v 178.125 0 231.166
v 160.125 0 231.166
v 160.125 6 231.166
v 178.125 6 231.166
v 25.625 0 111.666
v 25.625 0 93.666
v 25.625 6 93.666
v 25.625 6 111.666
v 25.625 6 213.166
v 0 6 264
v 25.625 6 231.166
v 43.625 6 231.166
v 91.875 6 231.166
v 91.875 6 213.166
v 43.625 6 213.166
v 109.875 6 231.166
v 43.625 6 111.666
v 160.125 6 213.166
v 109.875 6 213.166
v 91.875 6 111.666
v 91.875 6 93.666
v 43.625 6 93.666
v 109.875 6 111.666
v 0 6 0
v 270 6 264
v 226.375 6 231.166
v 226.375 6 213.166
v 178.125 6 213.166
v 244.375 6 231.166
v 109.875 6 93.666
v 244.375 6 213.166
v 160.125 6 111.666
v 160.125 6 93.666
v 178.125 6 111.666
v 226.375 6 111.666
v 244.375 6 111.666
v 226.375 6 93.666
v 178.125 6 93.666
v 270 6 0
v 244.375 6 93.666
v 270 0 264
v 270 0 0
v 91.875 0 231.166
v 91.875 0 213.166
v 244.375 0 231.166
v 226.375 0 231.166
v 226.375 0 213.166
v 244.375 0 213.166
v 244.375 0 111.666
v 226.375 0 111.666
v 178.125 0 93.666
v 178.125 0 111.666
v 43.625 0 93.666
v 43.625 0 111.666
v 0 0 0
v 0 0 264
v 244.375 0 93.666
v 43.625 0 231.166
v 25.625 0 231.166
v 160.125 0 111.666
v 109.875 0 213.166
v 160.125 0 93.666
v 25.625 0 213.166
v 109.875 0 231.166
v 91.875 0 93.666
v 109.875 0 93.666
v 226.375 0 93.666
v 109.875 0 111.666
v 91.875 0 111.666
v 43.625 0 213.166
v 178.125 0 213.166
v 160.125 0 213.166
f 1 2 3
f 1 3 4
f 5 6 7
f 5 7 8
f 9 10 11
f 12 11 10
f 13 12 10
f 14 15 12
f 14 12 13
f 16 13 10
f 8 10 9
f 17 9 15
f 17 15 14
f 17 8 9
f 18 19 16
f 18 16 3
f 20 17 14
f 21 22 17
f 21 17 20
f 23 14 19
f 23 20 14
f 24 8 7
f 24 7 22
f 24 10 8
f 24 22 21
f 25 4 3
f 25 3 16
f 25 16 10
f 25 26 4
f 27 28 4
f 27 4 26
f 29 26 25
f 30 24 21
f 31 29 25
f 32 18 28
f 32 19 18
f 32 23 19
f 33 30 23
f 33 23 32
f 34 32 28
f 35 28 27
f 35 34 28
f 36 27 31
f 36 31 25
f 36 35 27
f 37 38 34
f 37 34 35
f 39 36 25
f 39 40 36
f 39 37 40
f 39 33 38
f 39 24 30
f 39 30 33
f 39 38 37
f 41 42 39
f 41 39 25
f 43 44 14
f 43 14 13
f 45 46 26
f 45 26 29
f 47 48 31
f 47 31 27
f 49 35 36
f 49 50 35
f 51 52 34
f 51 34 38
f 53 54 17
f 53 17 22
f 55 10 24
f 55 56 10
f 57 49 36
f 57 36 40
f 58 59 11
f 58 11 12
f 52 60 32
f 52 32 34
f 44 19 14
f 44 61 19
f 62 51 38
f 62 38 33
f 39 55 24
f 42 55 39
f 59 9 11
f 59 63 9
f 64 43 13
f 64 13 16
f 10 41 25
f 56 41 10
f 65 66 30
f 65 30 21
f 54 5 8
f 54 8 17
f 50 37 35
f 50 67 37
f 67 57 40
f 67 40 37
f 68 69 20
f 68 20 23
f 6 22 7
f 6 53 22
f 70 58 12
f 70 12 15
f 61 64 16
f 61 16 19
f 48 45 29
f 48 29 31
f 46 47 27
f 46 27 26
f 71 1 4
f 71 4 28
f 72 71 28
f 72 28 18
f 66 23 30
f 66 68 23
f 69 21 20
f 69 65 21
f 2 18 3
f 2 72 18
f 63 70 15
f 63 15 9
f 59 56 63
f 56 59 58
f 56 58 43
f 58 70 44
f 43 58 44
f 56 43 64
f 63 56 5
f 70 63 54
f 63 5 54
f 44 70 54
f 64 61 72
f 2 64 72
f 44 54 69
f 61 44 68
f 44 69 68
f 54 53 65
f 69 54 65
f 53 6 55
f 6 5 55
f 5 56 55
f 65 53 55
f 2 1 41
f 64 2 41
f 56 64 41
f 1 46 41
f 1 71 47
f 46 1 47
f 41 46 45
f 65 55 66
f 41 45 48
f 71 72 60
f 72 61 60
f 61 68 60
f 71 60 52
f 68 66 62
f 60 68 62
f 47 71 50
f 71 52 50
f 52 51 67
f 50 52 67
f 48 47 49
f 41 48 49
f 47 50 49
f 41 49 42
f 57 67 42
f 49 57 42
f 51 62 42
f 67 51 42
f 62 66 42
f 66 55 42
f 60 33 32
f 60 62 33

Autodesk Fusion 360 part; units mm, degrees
sketch "Sketch1" plane through (0, 0, 0) normal (0, 1, 0) x (1, 0, 0)
  line L0 (0, 0) -> (270, 0)
  line L1 (270, 0) -> (270, -264)
  line L2 (270, -264) -> (0, -264)
  line L3 (0, -264) -> (0, 0)
  dimension "d1" = 270
  dimension "d2" = 264
extrude "Extrude1" add sketch "Sketch1" along normal blind 6
sketch "Sketch2" plane through (0, 0, 0) normal (0, -1, 0) x (1, 0, 0)
  line L0 (270, 264) -> (0, 264)
  line L1 (0, 264) -> (0, 0)
  line L2 (0, 0) -> (270, 0)
  line L3 (270, 0) -> (270, 264)
  line L4 (25.625, 231.1665) -> (43.625, 231.1665)
  line L5 (43.625, 231.1665) -> (43.625, 213.1665)
  line L6 (43.625, 213.1665) -> (25.625, 213.1665)
  line L7 (25.625, 213.1665) -> (25.625, 231.1665)
  line L8 (91.875, 231.1665) -> (109.875, 231.1665)
  line L9 (109.875, 231.1665) -> (109.875, 213.1665)
  line L10 (109.875, 213.1665) -> (91.875, 213.1665)
  line L11 (91.875, 213.1665) -> (91.875, 231.1665)
  line L12 (160.125, 231.1665) -> (178.125, 231.1665)
  line L13 (178.125, 231.1665) -> (178.125, 213.1665)
  line L14 (178.125, 213.1665) -> (160.125, 213.1665)
  line L15 (160.125, 213.1665) -> (160.125, 231.1665)
  line L16 (226.375, 231.1665) -> (244.375, 231.1665)
  line L17 (244.375, 231.1665) -> (244.375, 213.1665)
  line L18 (244.375, 213.1665) -> (226.375, 213.1665)
  line L19 (226.375, 213.1665) -> (226.375, 231.1665)
  line L20 (25.625, 111.6665) -> (43.625, 111.6665)
  line L21 (43.625, 111.6665) -> (43.625, 93.6665)
  line L22 (43.625, 93.6665) -> (25.625, 93.6665)
  line L23 (25.625, 93.6665) -> (25.625, 111.6665)
  line L24 (91.875, 111.6665) -> (109.875, 111.6665)
  line L25 (109.875, 111.6665) -> (109.875, 93.6665)
  line L26 (109.875, 93.6665) -> (91.875, 93.6665)
  line L27 (91.875, 93.6665) -> (91.875, 111.6665)
  line L28 (160.125, 111.6665) -> (178.125, 111.6665)
  line L29 (178.125, 111.6665) -> (178.125, 93.6665)
  line L30 (178.125, 93.6665) -> (160.125, 93.6665)
  line L31 (160.125, 93.6665) -> (160.125, 111.6665)
  line L32 (226.375, 111.6665) -> (244.375, 111.6665)
  line L33 (244.375, 111.6665) -> (244.375, 93.6665)
  line L34 (244.375, 93.6665) -> (226.375, 93.6665)
  line L35 (226.375, 93.6665) -> (226.375, 111.6665)
  dimension "d5" = 18
  dimension "d6" = 18
  dimension "d7" = 18
  dimension "d8" = 18
  dimension "d9" = 18
  dimension "d10" = 18
  dimension "d11" = 270
  dimension "d12" = 264
  dimension "d13" = 25.625
  dimension "d17" = 32.8335
  dimension "d18" = 152.3335
  dimension "d19" = 48.25
  dimension "d22" = 48.25
  dimension "d24" = 25.625
extrude "Extrude2" cut sketch "Sketch2" against normal blind 6 contours L4 L5 L6 L7 | L8 L9 L10 L11 | L12 L13 L14 L15 | L16 L17 L18 L19 | L20 L21 L22 L23 | L24 L25 L26 L27 | L28 L29 L30 L31 | L32 L33 L34 L35
equation "d13 = 3 mm + ( ( 63.25 / 2 ) * 1 mm ) - ( ( 18 / 2 ) * 1 mm )"
equation "d17 = 3 mm + ( ( 77.667 / 2 ) * 1 mm ) - ( ( 18 / 2 ) * 1 mm )"
equation "d18 = 122.5 mm + ( ( 77.667 / 2 ) * 1 mm ) - ( ( 18 / 2 ) * 1 mm )"
equation "d19 = 3 mm + 63.25 mm - 18 mm"
equation "d22 = 3 mm + 63.25 mm - 18 mm"
equation "d24 = 3 mm + ( ( 63.25 / 2 ) * 1 mm ) - ( ( 18 / 2 ) * 1 mm )"
